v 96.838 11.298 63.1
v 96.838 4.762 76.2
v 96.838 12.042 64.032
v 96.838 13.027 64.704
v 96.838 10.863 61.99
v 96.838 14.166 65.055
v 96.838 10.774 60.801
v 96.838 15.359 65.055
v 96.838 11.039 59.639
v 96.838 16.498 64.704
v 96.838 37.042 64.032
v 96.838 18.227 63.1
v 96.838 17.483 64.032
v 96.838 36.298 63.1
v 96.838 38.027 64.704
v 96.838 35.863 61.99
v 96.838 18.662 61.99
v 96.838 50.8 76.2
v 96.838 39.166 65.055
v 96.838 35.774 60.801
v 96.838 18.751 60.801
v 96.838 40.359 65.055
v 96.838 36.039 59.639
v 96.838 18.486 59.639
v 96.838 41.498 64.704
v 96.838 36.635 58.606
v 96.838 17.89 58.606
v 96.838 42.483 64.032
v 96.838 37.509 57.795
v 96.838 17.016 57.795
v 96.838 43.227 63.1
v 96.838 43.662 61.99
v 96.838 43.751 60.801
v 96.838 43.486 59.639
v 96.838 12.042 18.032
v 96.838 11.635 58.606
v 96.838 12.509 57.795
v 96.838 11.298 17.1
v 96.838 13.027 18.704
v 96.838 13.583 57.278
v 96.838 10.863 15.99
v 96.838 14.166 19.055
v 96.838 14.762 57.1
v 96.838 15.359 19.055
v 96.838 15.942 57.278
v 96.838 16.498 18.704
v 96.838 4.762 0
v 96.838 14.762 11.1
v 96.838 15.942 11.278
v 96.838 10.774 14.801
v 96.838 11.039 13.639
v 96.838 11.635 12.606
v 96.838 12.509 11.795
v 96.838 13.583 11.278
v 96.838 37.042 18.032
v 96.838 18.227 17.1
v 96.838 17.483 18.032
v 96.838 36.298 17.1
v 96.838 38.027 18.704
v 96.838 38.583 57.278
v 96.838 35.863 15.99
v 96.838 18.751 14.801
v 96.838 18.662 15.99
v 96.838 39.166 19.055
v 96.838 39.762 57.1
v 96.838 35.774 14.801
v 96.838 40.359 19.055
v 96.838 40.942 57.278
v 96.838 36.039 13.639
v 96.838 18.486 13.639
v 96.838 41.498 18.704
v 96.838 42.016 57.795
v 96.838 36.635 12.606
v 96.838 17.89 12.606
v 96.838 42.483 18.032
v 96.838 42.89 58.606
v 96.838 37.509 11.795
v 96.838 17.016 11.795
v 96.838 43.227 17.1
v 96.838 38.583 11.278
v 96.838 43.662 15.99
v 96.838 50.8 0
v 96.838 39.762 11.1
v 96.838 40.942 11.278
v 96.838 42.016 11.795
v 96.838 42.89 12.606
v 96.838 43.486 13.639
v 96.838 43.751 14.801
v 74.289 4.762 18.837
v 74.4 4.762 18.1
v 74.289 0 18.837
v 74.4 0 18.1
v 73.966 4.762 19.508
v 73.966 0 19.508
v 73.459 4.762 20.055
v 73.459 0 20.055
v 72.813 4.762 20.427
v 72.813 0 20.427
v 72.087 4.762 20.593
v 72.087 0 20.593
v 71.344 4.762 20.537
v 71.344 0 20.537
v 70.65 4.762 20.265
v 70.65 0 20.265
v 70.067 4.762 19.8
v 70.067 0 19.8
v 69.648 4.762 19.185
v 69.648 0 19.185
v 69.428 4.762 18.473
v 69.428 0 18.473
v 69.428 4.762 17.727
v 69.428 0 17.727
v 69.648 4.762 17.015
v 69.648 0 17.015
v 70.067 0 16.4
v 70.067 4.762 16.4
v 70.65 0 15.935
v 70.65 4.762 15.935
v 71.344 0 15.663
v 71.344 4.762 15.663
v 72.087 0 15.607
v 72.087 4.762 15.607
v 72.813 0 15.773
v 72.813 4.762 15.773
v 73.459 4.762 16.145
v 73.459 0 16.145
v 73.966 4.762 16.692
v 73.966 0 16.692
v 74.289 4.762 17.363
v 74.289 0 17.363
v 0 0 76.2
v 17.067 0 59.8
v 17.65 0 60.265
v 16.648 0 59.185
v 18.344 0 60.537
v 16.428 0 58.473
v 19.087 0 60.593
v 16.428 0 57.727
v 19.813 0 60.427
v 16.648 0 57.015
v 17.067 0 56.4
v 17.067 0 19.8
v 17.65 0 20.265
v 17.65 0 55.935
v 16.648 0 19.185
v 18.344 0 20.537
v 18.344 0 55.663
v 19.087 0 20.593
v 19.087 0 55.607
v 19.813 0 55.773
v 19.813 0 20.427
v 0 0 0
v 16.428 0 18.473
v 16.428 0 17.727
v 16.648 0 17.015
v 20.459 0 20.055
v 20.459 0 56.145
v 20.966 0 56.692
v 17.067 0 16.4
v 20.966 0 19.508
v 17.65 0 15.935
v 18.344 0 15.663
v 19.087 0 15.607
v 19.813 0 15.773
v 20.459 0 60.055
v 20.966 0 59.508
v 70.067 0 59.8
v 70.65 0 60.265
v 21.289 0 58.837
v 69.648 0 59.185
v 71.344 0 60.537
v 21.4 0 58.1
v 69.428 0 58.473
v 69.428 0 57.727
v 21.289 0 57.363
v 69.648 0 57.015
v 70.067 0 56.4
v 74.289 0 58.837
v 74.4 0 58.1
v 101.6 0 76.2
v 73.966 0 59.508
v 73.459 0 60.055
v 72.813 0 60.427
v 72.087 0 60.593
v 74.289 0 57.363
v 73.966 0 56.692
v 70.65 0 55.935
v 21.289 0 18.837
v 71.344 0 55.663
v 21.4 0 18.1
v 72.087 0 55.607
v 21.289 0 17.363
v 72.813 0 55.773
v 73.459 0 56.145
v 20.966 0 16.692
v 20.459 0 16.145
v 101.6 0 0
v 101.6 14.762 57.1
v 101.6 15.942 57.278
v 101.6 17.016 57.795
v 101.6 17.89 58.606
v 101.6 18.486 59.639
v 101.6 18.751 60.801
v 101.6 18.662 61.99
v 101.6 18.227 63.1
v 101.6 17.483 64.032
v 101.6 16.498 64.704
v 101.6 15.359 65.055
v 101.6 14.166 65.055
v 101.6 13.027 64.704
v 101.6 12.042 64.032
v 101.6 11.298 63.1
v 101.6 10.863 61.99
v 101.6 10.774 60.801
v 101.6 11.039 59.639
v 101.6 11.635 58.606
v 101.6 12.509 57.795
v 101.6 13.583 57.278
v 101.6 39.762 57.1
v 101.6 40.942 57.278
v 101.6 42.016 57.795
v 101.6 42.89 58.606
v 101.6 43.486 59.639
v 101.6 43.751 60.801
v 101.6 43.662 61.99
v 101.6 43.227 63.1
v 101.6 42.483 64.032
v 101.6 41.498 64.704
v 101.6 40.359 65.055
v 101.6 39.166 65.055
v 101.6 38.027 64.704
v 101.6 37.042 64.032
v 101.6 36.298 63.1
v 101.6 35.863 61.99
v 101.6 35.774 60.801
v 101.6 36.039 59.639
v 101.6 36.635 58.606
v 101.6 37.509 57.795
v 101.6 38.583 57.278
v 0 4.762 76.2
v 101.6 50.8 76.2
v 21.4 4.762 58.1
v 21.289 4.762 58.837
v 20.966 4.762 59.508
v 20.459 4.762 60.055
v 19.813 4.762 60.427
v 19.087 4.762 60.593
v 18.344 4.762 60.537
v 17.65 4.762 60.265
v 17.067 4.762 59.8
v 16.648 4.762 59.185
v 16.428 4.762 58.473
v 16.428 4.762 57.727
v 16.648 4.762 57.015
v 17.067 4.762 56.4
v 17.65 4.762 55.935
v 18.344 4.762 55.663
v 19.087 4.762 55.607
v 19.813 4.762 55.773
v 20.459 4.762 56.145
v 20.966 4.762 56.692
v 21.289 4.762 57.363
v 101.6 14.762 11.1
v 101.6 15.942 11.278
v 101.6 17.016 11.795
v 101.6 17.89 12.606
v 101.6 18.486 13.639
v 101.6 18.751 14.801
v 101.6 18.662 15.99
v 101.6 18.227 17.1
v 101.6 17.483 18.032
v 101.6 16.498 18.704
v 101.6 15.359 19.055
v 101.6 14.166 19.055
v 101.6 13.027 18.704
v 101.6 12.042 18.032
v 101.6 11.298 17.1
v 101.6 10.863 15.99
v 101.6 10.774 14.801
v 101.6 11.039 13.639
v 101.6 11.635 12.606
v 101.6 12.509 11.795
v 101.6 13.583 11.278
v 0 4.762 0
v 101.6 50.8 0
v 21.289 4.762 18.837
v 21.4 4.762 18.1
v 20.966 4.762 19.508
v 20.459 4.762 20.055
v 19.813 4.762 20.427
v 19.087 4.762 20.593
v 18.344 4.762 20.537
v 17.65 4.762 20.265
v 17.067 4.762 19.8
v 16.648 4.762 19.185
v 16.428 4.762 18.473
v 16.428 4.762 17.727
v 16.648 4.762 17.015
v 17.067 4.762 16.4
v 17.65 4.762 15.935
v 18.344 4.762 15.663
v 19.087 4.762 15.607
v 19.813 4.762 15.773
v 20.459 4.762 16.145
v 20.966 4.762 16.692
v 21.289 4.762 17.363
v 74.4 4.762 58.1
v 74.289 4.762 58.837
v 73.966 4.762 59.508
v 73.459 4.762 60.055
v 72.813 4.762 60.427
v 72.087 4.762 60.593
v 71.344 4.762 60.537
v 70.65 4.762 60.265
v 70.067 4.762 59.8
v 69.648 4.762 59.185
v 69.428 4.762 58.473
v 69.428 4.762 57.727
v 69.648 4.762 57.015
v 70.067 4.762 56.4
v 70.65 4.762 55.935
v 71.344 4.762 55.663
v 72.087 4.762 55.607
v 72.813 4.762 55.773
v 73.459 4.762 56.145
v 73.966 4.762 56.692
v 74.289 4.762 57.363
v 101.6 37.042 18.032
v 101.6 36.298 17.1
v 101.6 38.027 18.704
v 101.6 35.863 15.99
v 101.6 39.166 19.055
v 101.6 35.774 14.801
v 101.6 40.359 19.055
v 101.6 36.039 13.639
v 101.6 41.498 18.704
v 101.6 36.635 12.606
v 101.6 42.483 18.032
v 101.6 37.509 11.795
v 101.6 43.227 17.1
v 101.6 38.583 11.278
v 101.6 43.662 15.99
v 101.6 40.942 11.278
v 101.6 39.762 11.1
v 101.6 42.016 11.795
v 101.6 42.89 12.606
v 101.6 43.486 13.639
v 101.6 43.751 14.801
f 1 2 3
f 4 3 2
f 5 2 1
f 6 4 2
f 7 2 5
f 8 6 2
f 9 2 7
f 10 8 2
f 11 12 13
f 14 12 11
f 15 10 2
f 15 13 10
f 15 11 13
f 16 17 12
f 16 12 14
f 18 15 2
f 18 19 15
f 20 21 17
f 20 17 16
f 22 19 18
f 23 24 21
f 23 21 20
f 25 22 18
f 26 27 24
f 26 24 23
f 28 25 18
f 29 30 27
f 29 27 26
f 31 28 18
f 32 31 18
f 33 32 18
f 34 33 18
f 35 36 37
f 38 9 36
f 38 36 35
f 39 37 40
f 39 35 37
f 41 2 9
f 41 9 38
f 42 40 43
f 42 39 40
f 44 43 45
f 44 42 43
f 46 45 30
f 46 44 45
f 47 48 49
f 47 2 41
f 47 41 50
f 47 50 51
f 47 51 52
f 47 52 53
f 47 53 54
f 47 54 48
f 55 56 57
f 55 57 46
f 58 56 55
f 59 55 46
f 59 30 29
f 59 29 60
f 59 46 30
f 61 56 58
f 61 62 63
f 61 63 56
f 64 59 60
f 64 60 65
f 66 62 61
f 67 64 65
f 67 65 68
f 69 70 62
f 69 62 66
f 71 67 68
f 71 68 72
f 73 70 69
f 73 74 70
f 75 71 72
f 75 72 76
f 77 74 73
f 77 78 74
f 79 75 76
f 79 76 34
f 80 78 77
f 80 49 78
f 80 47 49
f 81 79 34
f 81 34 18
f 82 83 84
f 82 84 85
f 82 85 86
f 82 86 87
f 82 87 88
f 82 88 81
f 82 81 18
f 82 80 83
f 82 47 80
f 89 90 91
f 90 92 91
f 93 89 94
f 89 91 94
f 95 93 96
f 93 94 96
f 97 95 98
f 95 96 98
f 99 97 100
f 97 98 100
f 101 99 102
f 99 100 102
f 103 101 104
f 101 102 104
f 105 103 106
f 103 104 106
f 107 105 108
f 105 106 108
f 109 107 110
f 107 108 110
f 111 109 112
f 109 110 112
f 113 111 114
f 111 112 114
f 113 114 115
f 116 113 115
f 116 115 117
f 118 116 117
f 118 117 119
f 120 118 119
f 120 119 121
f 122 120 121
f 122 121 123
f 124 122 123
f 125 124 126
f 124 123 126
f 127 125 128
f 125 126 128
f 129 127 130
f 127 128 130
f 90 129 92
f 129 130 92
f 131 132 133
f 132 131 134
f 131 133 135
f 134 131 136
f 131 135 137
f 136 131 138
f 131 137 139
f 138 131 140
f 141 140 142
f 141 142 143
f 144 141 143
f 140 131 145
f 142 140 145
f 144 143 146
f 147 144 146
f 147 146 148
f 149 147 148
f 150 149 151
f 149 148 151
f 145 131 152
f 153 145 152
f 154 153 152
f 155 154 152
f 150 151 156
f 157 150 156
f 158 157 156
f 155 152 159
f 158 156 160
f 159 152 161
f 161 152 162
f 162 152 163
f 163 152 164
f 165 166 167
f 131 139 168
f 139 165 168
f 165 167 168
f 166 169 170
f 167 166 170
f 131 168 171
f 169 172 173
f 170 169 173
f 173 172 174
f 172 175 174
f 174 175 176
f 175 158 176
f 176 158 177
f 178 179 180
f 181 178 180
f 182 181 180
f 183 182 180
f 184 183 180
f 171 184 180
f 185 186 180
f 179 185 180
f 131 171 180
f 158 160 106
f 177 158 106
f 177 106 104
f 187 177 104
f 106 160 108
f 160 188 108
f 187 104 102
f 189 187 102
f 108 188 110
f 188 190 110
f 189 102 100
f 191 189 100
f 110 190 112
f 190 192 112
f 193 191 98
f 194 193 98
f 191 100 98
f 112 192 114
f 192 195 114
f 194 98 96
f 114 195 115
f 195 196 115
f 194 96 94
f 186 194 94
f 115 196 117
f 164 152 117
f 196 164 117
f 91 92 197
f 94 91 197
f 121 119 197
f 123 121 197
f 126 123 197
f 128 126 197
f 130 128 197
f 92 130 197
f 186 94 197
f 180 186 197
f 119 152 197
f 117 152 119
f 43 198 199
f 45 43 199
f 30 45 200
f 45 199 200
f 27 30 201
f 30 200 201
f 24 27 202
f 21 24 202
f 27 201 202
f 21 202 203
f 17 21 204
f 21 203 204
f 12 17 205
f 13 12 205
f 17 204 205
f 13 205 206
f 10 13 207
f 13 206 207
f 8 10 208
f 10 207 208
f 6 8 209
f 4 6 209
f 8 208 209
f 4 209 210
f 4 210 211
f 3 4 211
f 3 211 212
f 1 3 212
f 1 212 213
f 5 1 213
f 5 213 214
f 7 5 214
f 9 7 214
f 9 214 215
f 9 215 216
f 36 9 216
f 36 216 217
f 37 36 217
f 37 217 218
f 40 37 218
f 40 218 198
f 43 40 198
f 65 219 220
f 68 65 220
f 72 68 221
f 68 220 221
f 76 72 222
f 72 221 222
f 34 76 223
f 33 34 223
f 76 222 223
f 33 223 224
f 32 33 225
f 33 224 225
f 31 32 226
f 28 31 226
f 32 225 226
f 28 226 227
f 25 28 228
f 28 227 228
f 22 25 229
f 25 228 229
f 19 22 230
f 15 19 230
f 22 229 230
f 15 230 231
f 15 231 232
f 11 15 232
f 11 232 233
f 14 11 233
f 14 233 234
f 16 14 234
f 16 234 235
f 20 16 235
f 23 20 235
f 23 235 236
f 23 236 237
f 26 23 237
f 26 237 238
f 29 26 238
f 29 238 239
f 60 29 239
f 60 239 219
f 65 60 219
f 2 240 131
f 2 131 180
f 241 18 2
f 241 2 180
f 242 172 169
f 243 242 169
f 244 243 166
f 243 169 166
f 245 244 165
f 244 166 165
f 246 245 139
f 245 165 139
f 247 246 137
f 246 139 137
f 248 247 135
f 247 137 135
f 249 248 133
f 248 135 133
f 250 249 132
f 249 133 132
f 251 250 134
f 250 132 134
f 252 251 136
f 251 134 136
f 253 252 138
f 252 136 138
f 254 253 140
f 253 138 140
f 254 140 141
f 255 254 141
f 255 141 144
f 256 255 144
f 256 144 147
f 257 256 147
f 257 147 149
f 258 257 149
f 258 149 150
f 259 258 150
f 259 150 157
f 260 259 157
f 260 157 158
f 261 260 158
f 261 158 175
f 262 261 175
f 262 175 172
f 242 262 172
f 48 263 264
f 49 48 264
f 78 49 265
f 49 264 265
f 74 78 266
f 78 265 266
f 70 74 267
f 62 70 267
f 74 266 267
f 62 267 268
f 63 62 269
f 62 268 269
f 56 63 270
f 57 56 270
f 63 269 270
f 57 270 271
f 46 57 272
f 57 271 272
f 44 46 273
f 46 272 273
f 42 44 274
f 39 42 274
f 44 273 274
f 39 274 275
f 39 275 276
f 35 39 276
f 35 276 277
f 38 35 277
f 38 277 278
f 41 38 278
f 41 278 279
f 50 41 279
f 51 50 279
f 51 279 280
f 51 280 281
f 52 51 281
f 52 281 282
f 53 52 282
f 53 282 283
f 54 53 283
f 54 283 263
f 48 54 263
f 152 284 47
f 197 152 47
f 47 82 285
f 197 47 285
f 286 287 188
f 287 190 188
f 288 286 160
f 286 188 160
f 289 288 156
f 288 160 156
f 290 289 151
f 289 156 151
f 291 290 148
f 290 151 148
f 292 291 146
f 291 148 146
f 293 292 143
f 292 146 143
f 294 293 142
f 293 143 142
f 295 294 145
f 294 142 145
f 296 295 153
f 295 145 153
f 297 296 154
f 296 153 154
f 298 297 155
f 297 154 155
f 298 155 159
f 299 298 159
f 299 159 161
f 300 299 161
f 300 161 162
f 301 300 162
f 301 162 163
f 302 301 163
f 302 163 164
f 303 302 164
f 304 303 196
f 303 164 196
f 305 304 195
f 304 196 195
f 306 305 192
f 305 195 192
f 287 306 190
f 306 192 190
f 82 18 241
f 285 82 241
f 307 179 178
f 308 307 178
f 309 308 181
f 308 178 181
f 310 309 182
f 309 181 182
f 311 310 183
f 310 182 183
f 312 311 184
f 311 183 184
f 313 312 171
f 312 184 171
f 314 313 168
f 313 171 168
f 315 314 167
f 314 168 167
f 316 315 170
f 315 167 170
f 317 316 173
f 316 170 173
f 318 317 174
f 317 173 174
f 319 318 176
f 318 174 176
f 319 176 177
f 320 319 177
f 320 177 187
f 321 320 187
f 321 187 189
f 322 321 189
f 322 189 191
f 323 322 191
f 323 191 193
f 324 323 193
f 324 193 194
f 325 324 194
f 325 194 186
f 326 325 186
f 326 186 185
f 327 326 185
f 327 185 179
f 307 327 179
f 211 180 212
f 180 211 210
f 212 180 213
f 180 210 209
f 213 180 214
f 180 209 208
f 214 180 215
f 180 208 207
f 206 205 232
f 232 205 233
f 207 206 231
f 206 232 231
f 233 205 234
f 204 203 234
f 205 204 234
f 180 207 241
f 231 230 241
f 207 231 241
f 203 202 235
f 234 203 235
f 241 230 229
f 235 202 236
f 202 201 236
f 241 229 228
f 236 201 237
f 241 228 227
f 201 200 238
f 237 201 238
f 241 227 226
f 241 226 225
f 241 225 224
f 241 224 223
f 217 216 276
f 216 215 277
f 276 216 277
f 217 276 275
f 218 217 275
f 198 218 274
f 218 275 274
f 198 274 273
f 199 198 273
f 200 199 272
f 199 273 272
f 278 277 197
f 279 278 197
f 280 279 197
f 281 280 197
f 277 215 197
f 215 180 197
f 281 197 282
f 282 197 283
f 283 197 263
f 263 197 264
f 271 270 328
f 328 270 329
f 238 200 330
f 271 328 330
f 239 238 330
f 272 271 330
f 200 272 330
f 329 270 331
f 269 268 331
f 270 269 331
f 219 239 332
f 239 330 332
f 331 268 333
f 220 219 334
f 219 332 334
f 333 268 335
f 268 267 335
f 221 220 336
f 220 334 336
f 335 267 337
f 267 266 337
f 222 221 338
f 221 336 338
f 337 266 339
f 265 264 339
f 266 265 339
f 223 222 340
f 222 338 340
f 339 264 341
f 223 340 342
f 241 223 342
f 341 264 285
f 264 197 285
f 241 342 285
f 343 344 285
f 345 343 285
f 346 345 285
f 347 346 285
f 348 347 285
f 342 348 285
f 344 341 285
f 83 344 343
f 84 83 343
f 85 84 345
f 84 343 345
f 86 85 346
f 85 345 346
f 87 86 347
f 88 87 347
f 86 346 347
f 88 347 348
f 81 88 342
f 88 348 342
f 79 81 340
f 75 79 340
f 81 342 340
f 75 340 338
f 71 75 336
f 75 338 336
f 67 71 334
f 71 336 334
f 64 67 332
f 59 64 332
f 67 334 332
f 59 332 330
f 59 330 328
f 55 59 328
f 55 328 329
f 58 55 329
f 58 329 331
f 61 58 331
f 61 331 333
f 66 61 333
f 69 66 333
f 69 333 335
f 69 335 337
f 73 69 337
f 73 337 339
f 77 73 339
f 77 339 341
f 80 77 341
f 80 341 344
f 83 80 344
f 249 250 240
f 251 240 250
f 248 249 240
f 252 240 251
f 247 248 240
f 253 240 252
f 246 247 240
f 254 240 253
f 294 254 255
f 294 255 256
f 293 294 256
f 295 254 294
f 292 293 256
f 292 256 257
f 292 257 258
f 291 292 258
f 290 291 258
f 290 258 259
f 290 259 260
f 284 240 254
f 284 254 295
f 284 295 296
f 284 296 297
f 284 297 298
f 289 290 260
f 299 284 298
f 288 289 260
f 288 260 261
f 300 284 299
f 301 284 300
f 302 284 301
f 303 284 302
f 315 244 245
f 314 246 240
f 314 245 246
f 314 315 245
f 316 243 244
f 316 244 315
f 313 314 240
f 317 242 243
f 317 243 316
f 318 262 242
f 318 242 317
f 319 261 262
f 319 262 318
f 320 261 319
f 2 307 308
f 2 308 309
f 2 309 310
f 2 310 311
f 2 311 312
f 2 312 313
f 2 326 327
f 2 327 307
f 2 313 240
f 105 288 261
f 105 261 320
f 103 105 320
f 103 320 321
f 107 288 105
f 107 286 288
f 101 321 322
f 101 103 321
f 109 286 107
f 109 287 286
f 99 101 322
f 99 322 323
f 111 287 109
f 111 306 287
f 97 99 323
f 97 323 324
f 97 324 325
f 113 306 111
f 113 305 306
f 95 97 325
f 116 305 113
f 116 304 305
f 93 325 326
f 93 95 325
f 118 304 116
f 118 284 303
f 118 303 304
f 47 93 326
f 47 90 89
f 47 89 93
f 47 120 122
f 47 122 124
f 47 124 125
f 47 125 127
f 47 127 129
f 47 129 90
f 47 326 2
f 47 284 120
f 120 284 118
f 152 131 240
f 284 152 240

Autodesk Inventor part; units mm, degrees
ref_plane "YZ Plane" through (0, 0, 0) normal (1, 0, 0) x (0, 1, 0)
ref_plane "XZ Plane" through (0, 0, 0) normal (0, 1, 0) x (-1, 0, 0)
ref_plane "XY Plane" through (0, 0, 0) normal (0, 0, 1) x (1, 0, 0)
sketch "Sketch1" plane through (0, 0, 0) normal (0, 0, 1) x (1, 0, 0)
  line L0 (0, 0) -> (101.6, 0)
  line L1 (101.6, 0) -> (101.6, 50.8)
  line L2 (0, 0) -> (0, 4.7625)
  line L3 (0, 4.7625) -> (96.8375, 4.7625)
  line L4 (96.8375, 4.7625) -> (96.8375, 50.8)
  line L5 (96.8375, 50.8) -> (101.6, 50.8)
  dimension "d0" = 101.6
  dimension "d1" = 50.8
  dimension "d2" = 4.7625
extrude "Extrusion1" add sketch "Sketch1" along normal blind 76.2
sketch "Sketch2" plane through (0, 0, 0) normal (0, -1, 0) x (1, 0, 0)
  line L0 (18.9, 18.1) -> (71.9, 18.1) construction
  line L1 (71.9, 18.1) -> (71.9, 58.1) construction
  line L2 (71.9, 58.1) -> (18.9, 58.1) construction
  line L3 (18.9, 58.1) -> (18.9, 18.1) construction
  line L4 (101.6, 0) -> (101.6, 76.2) construction
  circle A0 centre (18.9, 58.1) radius 2.5
  circle A1 centre (18.9, 18.1) radius 2.5
  circle A2 centre (71.9, 58.1) radius 2.5
  circle A3 centre (71.9, 18.1) radius 2.5
  point P0 (0, 0)
  point P1 (45.4, 58.1)
  point P2 (71.9, 38.1)
  point P3 (101.6, 38.1)
  dimension "d5" = 53
  dimension "d6" = 40
  dimension "d7" = 56.2
  dimension "d8" = 5
extrude "Extrusion2" cut sketch "Sketch2" against normal up to surface (4.7625 mm away)
sketch "Sketch3" plane through (101.6, 0, 0) normal (1, 0, 0) x (0, 0, -1)
  line L0 (-15.1, 14.7625) -> (-61.1, 14.7625) construction
  line L1 (-61.1, 14.7625) -> (-61.1, 39.7625) construction
  line L2 (-61.1, 39.7625) -> (-15.1, 39.7625) construction
  line L3 (-15.1, 39.7625) -> (-15.1, 14.7625) construction
  line L4 (0, 0) -> (-76.2, 0) construction
  circle A0 centre (-15.1, 14.7625) radius 4
  circle A1 centre (-15.1, 39.7625) radius 4
  circle A2 centre (-61.1, 14.7625) radius 4
  circle A3 centre (-61.1, 39.7625) radius 4
  point P0 (0, 4.7625)
  point P1 (-38.1, 14.7625)
  point P2 (-38.1, 0)
  dimension "d11" = 46
  dimension "d12" = 25
  dimension "d13" = 10
  dimension "d14" = 8
extrude "Extrusion3" cut sketch "Sketch3" against normal blind 25.4
properties part number "L_Bracketr"
